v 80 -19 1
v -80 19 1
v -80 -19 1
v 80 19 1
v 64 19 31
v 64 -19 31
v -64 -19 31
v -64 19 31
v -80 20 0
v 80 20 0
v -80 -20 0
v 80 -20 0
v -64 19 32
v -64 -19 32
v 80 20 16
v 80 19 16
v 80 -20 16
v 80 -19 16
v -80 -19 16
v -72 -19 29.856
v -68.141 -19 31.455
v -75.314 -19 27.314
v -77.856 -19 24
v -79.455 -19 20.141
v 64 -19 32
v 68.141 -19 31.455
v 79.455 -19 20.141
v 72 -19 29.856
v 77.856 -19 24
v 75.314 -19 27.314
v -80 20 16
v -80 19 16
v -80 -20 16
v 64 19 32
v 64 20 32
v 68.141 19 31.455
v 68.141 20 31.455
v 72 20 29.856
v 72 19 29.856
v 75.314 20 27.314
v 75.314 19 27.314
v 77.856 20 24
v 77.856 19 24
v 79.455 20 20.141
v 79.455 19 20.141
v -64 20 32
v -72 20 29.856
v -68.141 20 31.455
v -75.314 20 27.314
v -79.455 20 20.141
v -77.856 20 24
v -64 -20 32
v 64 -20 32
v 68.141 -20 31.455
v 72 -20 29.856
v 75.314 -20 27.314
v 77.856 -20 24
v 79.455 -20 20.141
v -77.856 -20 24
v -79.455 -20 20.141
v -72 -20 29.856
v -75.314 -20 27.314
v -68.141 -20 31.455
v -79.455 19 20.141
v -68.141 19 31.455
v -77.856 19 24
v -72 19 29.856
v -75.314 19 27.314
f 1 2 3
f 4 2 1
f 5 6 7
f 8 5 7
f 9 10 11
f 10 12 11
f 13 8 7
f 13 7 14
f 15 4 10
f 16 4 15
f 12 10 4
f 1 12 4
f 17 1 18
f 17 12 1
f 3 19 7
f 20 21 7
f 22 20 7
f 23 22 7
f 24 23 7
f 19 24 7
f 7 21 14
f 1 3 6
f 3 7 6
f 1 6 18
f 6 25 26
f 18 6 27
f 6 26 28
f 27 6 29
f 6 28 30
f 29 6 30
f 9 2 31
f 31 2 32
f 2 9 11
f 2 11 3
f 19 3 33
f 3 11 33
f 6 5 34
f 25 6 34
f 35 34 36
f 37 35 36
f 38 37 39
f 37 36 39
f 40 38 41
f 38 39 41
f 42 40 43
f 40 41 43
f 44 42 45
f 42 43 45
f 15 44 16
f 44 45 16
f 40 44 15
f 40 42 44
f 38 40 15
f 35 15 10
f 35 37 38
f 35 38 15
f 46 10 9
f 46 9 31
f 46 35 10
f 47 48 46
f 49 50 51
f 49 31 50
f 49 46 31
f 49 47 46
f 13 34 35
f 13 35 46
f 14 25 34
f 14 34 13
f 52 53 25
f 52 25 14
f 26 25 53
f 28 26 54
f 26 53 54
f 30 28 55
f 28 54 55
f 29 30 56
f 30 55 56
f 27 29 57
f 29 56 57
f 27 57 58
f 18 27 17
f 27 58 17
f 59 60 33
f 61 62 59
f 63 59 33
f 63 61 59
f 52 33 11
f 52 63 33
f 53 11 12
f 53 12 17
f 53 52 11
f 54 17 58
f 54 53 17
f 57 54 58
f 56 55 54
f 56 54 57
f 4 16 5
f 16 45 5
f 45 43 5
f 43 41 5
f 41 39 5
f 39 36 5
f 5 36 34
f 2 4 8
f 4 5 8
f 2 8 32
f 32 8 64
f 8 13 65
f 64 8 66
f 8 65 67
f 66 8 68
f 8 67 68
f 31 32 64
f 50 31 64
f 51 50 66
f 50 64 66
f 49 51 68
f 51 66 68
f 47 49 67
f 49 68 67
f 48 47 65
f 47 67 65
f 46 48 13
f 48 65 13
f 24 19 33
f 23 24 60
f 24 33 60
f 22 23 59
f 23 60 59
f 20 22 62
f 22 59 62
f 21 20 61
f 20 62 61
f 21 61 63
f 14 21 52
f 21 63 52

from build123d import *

# Parameters (mm, degrees)
F0_W      = 160
F0_H      = 38
F1_DEPTH  = 1
F2_W      = 160
F2_H      = 32
F3_DEPTH  = 1
F4_W      = 160
F4_H      = 32
F5_DEPTH  = 1
F7_DEPTH  = 40.001
F8_DEPTH  = 40.001
F9_W      = 128
F9_H      = 1
F10_DEPTH = 38


with BuildPart() as f1:
    # F0 (on Top) → F1 (new body)
    with BuildSketch(Plane.XY):
        Rectangle(F0_W, F0_H)
    extrude(amount=F1_DEPTH)

    # F2 (on face) → F3 (join)
    with BuildSketch(Plane.XZ.offset(19)):
        with Locations((0, 16)):
            Rectangle(F2_W, F2_H)
    extrude(amount=F3_DEPTH)

    # F4 (on face) → F5 (join)
    with BuildSketch(Plane(origin=(0, 19, 0), x_dir=(-1, 0, 0), z_dir=(0, 1, 0))):
        with Locations((0, 16)):
            Rectangle(F4_W, F4_H)
    extrude(amount=F5_DEPTH)

    # F6 (on face) → F7 (cut, through all)
    with BuildSketch(Plane.XZ.offset(20)):
        with BuildLine():
            ThreePointArc((-80, 16), (-75.313708, 27.313708), (-64, 32))
            Line((-64, 32), (-80, 32))
            Line((-80, 32), (-80, 16))
        make_face()
    extrude(amount=-F7_DEPTH, mode=Mode.SUBTRACT)

    # F6 (on face) → F8 (cut, through all)
    with BuildSketch(Plane.XZ.offset(20)):
        with BuildLine():
            Line((80, 32), (64, 32))
            ThreePointArc((64, 32), (75.313708, 27.313708), (80, 16))
            Line((80, 16), (80, 32))
        make_face()
    extrude(amount=-F8_DEPTH, mode=Mode.SUBTRACT)

    # F9 (on face) → F10 (join)
    with BuildSketch(Plane(origin=(0, -19, 0), x_dir=(-1, 0, 0), z_dir=(0, 1, 0))):
        with Locations((0, 31.5)):
            Rectangle(F9_W, F9_H)
    extrude(amount=F10_DEPTH)


solid = f1.part
